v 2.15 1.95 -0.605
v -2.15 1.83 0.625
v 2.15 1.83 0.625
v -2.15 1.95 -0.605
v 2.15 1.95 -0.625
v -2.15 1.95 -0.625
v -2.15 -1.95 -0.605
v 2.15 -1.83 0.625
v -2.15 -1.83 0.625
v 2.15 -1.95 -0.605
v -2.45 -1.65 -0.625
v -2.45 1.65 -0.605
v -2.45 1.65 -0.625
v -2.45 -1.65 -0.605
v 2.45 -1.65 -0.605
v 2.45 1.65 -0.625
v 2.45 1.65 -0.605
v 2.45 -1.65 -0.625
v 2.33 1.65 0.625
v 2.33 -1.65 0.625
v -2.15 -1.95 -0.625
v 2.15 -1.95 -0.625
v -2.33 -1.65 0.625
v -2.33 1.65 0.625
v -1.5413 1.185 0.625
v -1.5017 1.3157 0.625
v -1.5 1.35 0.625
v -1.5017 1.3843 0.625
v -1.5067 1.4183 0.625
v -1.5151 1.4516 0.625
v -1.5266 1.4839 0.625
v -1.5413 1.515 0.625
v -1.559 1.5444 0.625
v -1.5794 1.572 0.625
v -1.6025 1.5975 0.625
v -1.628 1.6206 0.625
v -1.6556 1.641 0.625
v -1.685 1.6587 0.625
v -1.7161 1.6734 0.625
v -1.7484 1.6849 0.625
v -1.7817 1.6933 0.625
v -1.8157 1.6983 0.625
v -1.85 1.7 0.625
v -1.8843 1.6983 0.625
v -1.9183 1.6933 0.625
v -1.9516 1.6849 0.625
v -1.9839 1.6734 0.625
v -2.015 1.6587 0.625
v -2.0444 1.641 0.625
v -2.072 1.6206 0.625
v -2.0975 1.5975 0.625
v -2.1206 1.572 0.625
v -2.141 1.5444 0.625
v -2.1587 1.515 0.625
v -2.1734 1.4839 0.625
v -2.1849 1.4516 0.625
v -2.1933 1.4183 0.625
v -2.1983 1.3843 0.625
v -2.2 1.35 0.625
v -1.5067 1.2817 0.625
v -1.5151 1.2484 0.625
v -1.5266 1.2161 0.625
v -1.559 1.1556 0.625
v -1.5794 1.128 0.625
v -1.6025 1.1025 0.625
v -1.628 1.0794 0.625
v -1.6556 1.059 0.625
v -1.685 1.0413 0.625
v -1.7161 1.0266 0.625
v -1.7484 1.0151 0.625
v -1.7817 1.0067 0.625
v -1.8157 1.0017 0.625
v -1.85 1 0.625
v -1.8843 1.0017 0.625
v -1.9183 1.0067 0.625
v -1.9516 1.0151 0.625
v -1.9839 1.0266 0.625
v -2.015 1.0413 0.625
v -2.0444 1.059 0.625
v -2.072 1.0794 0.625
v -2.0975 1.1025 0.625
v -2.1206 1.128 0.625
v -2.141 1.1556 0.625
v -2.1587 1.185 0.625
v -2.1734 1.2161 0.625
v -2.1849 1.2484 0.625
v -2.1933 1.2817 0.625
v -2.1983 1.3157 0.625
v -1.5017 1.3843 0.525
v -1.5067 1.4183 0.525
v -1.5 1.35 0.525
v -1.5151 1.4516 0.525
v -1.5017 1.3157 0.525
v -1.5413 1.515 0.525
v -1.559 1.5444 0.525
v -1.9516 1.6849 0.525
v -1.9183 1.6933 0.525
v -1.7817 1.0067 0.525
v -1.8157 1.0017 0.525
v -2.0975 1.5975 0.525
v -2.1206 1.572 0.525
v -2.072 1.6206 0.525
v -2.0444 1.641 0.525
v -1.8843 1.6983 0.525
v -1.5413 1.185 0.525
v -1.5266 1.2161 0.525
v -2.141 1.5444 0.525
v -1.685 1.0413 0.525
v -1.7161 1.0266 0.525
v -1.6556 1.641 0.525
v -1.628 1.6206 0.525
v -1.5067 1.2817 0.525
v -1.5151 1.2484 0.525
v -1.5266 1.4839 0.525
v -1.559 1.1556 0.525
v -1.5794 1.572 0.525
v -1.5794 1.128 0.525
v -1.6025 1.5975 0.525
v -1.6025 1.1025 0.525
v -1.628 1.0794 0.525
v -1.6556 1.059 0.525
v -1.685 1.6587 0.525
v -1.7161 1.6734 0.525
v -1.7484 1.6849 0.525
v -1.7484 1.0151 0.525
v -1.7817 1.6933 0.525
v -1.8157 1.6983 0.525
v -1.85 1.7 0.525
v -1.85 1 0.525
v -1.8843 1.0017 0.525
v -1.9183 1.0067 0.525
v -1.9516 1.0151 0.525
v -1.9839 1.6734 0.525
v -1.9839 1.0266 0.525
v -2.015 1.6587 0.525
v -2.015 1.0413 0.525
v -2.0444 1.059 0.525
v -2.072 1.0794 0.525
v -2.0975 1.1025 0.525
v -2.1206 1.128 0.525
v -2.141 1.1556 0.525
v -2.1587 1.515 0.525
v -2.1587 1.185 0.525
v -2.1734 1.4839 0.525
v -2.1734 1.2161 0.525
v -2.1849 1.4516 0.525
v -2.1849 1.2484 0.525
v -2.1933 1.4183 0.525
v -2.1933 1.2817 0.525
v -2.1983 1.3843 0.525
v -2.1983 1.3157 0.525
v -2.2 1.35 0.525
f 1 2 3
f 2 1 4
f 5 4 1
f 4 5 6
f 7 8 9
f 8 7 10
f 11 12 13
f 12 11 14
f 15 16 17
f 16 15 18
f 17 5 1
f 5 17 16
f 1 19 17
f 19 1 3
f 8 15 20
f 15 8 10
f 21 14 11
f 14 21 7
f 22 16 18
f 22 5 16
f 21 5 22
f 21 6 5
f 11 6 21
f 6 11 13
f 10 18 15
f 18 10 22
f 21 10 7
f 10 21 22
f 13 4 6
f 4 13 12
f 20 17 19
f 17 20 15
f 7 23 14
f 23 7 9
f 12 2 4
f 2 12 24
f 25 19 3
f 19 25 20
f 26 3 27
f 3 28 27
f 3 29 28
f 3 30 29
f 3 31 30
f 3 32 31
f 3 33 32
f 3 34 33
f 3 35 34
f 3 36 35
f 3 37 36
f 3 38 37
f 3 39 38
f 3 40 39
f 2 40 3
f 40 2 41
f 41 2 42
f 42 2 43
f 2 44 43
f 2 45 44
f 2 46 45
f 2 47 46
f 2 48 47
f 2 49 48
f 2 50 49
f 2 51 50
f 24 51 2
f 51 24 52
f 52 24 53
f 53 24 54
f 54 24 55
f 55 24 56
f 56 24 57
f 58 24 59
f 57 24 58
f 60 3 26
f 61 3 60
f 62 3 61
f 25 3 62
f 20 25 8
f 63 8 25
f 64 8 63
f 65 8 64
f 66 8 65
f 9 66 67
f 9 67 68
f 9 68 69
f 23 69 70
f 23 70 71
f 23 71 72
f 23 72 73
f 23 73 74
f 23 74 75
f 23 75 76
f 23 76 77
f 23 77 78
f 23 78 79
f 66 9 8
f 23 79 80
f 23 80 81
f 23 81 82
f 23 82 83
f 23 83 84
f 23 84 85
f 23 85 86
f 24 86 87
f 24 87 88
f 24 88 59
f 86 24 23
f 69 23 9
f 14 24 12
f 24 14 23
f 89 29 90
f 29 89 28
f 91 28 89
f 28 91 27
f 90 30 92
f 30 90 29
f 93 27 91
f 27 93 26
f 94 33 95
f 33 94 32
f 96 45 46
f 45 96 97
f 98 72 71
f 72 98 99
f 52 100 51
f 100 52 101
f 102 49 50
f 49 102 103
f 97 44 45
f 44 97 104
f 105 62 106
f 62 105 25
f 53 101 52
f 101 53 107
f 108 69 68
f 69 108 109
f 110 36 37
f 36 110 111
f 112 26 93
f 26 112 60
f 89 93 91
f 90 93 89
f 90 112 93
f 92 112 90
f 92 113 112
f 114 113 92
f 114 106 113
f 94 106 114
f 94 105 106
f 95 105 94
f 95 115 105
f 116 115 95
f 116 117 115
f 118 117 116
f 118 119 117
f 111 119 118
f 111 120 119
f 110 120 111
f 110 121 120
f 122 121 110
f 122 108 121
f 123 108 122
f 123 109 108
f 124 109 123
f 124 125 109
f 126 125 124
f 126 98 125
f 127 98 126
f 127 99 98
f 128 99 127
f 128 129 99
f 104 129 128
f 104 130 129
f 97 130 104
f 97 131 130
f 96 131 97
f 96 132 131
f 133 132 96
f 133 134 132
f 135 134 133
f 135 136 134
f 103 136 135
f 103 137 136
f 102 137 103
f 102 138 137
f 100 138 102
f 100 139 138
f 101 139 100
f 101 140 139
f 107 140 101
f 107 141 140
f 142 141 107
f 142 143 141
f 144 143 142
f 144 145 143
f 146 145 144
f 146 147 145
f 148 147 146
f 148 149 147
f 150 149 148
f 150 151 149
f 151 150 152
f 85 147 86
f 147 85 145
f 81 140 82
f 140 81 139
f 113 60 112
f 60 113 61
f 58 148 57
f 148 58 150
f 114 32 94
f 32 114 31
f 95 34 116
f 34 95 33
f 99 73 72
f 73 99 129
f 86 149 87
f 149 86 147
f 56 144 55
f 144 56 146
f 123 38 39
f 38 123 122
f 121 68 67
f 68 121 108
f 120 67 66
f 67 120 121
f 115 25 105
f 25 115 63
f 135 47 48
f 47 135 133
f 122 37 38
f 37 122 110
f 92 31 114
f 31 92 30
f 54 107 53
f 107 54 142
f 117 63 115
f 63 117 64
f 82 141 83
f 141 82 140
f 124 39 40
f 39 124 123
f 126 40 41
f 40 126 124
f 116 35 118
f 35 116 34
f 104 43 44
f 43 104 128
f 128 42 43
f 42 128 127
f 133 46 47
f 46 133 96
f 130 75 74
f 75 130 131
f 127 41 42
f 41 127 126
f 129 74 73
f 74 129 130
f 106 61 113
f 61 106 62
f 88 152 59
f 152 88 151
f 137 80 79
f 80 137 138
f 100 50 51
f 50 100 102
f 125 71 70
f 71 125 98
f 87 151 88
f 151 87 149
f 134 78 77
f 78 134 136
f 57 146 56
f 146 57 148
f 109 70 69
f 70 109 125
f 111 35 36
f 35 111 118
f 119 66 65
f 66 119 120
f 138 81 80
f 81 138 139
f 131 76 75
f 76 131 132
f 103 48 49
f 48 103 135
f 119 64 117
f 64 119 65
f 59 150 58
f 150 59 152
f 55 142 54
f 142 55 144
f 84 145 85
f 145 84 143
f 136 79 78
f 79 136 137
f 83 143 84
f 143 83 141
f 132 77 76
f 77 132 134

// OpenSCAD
// SMD package envelope (must match exactly)
body_length = 4.90;   // X
body_width  = 3.90;   // Y
body_height = 1.25;   // Z

// Detail parameters (kept strictly INSIDE the envelope)
chamfer_xy = 0.30;          // corner chamfer in XY
top_edge_bevel = 0.12;      // slight top edge bevel (visual)
polarity_mark_radius = 0.35;
polarity_mark_depth  = 0.08; // engraved (subtracted), stays inside
polarity_mark_inset  = 0.60; // from top-left corner

eps = 0.02;
$fn = 64;

// 2D chamfered rectangle for robust 3D extrusion
module chamfered_rect_2d(L, W, c) {
    c2 = min(c, min(L, W)/2 - eps);
    polygon(points=[
        [ L/2 - c2,  W/2],
        [-L/2 + c2,  W/2],
        [-L/2,       W/2 - c2],
        [-L/2,      -W/2 + c2],
        [-L/2 + c2, -W/2],
        [ L/2 - c2, -W/2],
        [ L/2,      -W/2 + c2],
        [ L/2,       W/2 - c2]
    ]);
}

// Main body: chamfered footprint + slight top bevel (all within envelope)
module main_body() {
    // Bottom footprint (slightly more chamfered)
    c_bot = chamfer_xy;

    // Top footprint (slightly inset to create a bevel)
    inset = min(top_edge_bevel, min(body_length, body_width)/4);
    L_top = body_length - 2*inset;
    W_top = body_width  - 2*inset;
    c_top = max(chamfer_xy - inset, 0);

    // Ensure valid top dimensions
    L_top2 = max(L_top, eps*4);
    W_top2 = max(W_top, eps*4);

    // Build as a single solid via hull between bottom and top profiles
    hull() {
        translate([0, 0, -body_height/2])
            linear_extrude(height=eps, center=false)
                chamfered_rect_2d(body_length, body_width, c_bot);

        translate([0, 0,  body_height/2 - eps])
            linear_extrude(height=eps, center=false)
                chamfered_rect_2d(L_top2, W_top2, c_top);
    }
}

// Engraved polarity mark (subtracted) on top face, fully inside
module polarity_mark_cut() {
    x0 = -body_length/2 + polarity_mark_inset;
    y0 =  body_width/2  - polarity_mark_inset;

    // Clamp to keep circle fully inside top face
    x = min(max(x0, -body_length/2 + polarity_mark_radius + eps),
                 body_length/2 - polarity_mark_radius - eps);
    y = min(max(y0, -body_width/2  + polarity_mark_radius + eps),
                 body_width/2  - polarity_mark_radius - eps);

    // Cut down from the top surface
    translate([x, y, body_height/2 - polarity_mark_depth/2])
        cylinder(r=polarity_mark_radius, h=polarity_mark_depth + 2*eps, center=true);
}

module smd_complete() {
    // ONE connected solid, exact envelope, with visible SMD-like details
    difference() {
        main_body();
        polarity_mark_cut();
    }
}

smd_complete();
